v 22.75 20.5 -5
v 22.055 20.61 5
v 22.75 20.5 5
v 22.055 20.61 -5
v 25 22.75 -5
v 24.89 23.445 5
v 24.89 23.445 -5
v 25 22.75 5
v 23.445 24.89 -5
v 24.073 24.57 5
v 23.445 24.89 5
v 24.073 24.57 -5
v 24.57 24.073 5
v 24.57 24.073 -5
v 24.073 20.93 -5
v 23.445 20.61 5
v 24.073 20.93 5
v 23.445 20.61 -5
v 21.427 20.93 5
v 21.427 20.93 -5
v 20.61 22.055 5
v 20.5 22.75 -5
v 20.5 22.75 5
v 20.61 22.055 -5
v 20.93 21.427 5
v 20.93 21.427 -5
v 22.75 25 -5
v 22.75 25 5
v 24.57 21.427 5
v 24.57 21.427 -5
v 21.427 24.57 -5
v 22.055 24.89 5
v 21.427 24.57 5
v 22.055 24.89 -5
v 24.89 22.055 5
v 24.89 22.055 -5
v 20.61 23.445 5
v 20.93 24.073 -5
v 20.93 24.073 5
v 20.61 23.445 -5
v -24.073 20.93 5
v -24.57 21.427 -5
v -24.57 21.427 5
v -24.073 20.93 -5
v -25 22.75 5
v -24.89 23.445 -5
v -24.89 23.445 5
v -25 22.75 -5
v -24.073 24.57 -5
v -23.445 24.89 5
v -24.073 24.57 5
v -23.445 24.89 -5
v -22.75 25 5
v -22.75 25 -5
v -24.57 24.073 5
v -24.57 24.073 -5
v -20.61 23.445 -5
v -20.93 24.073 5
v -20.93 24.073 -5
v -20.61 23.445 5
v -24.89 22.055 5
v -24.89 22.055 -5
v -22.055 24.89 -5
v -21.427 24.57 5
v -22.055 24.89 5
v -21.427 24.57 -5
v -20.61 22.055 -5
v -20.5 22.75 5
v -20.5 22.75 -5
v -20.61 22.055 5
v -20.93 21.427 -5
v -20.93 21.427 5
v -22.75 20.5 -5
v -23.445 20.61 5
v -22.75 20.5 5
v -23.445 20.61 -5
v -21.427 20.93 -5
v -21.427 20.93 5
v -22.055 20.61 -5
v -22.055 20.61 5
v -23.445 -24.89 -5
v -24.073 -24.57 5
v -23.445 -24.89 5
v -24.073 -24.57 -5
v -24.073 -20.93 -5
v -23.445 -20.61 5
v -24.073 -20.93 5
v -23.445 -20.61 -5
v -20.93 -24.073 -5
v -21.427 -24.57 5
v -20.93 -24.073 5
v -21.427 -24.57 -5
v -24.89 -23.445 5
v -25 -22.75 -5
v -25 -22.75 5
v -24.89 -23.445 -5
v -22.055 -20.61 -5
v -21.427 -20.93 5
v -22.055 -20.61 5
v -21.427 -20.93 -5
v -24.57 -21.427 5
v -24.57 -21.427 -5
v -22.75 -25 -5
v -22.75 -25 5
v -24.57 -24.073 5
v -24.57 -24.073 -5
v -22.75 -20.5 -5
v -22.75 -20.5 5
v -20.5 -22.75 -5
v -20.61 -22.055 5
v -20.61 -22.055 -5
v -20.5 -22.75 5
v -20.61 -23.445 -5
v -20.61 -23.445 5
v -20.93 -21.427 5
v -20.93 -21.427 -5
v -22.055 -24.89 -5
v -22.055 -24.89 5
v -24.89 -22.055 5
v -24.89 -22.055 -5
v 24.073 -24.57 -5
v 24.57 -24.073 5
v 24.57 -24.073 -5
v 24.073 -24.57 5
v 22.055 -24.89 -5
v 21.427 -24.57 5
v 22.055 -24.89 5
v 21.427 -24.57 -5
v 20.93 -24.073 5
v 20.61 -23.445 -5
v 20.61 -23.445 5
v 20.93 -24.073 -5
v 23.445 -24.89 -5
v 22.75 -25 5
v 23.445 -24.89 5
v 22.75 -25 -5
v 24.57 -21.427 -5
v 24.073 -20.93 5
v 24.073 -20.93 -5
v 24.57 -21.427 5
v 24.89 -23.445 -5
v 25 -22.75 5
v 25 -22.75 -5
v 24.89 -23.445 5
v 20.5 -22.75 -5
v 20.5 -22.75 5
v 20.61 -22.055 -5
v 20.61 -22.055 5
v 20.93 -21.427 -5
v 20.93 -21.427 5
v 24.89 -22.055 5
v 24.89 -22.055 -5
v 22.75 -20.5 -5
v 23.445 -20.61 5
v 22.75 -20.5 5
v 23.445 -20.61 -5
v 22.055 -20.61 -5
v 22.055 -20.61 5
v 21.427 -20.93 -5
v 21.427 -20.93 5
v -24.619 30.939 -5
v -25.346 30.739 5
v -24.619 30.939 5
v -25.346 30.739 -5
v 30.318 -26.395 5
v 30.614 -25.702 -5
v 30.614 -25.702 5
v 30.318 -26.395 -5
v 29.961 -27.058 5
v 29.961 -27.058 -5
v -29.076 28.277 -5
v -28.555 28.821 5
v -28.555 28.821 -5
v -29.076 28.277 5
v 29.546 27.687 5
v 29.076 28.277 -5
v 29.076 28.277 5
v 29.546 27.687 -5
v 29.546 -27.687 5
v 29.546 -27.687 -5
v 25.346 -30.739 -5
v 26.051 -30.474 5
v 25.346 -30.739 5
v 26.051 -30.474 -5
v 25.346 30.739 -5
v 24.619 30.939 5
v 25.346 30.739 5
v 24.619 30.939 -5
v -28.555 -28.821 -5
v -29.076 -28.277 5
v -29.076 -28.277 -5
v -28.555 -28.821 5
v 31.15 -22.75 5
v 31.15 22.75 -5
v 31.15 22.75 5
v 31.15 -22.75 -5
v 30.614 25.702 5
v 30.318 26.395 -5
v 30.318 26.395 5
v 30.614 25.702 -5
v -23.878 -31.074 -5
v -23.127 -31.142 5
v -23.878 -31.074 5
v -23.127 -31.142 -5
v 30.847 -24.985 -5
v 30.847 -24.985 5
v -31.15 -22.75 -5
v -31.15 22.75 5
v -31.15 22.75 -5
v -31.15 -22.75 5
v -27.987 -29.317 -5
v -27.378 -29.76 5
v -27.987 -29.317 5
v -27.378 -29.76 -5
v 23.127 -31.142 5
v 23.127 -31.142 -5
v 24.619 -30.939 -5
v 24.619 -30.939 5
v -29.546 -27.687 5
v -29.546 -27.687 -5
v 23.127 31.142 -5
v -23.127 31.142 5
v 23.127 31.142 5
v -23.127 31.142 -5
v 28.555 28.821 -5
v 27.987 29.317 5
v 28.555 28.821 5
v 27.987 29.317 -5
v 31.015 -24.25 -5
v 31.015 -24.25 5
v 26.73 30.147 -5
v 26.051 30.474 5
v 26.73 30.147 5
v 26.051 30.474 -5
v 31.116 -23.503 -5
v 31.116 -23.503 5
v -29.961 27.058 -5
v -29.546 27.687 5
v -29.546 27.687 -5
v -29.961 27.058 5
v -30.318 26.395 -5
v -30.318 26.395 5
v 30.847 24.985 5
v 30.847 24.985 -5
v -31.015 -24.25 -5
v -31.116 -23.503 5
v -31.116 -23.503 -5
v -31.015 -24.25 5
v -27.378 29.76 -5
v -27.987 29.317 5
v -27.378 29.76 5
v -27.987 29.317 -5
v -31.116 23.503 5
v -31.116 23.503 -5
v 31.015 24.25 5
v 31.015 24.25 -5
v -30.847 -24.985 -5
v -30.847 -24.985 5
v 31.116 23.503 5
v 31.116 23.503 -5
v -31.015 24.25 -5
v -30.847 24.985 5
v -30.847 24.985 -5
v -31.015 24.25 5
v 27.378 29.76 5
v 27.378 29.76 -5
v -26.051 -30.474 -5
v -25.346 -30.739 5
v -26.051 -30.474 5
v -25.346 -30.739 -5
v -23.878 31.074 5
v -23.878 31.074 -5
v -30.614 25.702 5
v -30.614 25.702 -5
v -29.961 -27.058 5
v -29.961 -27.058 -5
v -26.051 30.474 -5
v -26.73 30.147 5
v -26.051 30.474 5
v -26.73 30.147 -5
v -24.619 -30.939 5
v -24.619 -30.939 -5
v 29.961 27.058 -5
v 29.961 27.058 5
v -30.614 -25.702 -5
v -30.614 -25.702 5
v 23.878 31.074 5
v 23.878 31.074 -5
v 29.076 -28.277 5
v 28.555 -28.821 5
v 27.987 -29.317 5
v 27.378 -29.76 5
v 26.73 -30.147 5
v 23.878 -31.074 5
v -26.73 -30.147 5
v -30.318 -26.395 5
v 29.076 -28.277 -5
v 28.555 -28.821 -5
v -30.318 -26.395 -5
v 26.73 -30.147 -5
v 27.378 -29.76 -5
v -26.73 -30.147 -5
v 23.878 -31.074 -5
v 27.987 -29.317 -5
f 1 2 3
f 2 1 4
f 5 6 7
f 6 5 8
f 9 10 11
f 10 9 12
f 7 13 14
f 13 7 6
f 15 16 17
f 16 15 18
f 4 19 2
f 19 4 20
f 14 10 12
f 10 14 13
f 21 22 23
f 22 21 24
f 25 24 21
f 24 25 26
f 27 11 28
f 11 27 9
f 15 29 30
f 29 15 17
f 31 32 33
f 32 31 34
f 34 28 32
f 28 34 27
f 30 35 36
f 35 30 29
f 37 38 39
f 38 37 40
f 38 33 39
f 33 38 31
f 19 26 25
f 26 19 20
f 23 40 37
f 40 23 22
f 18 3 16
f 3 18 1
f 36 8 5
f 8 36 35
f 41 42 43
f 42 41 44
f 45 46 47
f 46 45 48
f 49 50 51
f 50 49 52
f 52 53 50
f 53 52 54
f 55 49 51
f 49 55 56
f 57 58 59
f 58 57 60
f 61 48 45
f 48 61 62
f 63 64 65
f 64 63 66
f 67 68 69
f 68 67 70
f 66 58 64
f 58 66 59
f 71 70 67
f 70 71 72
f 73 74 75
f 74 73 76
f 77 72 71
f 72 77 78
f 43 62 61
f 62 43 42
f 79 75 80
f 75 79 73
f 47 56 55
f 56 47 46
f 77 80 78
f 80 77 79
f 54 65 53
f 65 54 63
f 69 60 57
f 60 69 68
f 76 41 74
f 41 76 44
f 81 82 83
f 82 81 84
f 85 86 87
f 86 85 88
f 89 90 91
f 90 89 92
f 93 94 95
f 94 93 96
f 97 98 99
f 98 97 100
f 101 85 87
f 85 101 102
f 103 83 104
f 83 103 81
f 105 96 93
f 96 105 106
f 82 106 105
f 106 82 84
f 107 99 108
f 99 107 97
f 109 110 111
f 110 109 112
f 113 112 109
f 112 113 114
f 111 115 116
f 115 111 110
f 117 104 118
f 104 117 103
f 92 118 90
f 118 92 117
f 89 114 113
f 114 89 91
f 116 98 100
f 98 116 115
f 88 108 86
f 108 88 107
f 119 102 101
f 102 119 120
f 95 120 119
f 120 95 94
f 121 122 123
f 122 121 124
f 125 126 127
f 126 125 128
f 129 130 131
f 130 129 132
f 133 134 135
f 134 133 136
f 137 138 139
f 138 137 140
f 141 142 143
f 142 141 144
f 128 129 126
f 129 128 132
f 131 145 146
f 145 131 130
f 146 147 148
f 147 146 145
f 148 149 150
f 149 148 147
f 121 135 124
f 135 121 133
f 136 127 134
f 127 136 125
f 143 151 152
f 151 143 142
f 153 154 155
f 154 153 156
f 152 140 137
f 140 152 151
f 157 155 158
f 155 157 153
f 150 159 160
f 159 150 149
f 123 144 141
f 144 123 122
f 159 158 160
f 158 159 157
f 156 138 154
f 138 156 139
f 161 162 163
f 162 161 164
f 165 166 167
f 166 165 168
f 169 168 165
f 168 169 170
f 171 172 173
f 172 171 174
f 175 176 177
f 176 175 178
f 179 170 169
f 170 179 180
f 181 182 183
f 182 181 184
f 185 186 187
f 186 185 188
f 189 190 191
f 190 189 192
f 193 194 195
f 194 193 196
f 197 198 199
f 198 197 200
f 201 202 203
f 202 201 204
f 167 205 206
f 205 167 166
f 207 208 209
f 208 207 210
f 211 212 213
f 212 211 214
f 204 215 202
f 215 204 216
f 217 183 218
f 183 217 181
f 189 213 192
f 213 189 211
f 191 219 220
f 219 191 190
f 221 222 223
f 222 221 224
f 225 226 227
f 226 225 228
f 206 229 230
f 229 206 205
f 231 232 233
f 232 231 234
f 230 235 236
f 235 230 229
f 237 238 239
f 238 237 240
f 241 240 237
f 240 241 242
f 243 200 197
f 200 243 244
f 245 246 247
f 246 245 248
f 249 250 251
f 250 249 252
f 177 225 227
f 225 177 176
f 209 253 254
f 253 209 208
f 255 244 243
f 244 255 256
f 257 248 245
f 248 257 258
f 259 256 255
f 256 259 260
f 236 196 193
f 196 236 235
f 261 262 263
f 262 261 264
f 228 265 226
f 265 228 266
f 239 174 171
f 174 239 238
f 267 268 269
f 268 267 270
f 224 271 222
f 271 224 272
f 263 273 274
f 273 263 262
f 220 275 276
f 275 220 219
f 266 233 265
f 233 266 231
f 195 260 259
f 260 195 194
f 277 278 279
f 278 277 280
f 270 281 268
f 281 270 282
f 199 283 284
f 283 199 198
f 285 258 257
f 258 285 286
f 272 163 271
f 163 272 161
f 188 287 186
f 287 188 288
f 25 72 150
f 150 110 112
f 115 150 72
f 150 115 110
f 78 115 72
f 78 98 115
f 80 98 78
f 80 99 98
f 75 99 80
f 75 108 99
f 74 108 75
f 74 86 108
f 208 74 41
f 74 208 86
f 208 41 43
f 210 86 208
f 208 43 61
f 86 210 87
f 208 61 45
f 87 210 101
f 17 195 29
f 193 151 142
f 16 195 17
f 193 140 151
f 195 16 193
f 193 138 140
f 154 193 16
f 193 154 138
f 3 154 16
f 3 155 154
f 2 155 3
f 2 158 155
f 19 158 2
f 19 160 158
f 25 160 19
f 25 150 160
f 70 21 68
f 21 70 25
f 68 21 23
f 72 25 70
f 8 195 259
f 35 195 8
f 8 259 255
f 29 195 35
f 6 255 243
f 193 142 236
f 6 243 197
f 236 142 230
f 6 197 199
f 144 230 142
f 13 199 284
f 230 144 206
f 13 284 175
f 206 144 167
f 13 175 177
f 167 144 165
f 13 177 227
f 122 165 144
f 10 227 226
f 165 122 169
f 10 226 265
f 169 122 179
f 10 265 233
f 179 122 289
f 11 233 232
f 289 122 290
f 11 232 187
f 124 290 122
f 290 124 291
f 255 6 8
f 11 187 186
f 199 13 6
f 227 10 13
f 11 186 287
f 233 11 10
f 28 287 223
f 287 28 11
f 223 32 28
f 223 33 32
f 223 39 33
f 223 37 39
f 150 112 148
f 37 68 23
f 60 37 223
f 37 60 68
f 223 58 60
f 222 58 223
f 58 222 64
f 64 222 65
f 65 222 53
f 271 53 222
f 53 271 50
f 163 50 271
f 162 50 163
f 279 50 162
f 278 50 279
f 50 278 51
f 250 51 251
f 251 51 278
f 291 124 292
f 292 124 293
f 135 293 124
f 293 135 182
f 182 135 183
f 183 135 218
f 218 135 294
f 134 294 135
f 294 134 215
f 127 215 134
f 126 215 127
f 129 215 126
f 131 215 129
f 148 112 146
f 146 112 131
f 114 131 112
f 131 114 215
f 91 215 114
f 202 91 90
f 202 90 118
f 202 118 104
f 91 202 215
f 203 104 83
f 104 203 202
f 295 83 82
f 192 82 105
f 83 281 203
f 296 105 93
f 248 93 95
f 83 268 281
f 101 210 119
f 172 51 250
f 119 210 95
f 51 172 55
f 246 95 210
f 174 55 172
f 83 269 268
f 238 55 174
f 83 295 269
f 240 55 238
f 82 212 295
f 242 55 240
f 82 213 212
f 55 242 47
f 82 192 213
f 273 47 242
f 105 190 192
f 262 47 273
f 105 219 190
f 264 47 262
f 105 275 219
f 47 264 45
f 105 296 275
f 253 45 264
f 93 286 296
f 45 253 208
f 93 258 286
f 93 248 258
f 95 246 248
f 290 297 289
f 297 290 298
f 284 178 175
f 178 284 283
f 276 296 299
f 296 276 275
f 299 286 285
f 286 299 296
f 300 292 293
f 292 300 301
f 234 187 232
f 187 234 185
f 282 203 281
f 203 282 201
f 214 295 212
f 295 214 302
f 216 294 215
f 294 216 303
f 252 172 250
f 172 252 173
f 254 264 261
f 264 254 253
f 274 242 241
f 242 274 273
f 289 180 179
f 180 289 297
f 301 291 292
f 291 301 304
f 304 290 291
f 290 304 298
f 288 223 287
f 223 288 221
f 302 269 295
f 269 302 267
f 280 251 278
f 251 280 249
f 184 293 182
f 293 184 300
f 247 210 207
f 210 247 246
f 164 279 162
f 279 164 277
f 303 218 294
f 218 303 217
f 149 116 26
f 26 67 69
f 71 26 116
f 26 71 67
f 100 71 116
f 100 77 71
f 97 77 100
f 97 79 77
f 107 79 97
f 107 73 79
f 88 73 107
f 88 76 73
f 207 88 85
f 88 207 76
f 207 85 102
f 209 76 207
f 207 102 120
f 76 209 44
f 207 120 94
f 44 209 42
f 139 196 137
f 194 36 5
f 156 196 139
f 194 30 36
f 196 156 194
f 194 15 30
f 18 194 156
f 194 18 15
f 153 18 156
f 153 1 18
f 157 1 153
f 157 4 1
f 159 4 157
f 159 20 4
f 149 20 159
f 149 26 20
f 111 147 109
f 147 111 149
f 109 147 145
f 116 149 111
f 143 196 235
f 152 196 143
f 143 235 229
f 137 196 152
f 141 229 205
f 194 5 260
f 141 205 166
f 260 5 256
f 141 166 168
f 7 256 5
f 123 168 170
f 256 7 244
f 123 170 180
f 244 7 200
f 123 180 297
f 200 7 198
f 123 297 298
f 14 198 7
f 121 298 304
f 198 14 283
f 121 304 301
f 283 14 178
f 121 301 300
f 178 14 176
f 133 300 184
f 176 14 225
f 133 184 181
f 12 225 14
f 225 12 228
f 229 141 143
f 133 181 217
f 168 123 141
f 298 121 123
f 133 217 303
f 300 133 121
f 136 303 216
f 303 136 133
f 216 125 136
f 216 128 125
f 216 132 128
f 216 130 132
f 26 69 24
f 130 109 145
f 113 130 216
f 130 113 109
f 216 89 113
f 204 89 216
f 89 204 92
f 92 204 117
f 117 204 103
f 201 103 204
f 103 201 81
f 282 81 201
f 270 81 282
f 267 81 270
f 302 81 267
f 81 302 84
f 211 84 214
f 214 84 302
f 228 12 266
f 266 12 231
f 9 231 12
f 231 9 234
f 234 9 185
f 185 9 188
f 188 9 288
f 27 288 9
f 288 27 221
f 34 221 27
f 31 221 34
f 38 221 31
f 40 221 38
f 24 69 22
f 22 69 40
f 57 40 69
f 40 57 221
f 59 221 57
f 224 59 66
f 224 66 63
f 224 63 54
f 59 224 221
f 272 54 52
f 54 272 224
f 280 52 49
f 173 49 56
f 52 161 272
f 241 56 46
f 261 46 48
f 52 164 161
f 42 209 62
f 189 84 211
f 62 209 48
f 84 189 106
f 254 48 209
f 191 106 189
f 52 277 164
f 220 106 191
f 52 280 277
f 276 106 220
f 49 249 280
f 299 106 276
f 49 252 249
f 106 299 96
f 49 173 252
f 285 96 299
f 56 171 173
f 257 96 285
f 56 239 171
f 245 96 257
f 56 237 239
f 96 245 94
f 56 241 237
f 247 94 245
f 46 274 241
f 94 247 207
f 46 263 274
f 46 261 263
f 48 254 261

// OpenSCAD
// file: ../../parameters.scad
maximum_printable_size = 150;

layer_thickness = 0.3;
global_clearance = 0.5;


// scale parameters
tower_height = 220;
mid_base_width = 400;
mid_base_height = 200;
mid_base_length = 300;
base_mid_base_hinge_offset = 50;


//Screw diameter and nut for M10 [mm]
M10_screw_diameter = 10.4;
M10_head_height = 10;
M10_head_diameter = 16+0.5;
M10_nut_height = 10.5;
M10_nut_diameter = 25.5;
M10_nut_pocket = 22.3;

//Screw diameter for M8 [mm]
M8_screw_diameter = 8.6;
M8_head_height = 8;
M8_head_diameter = 13.5;
M8_nut_height = 7.5;
M8_square_nut_thin_height = 4.5;
M8_nut_diameter = 14.4 + 0.5;
M8_nut_pocket = 13 + 0.5;
M8_washer_diameter = 16;
M8_washer_thickness = 1.5;


//Screw diameter and nut for M6 [mm]
M6_screw_diameter=6.5;
M6_head_diameter = 10+0.5;
M6_head_height = 6;
M6_nut_height = 4.9;
M6_nut_diameter = 11.8;
M6_nut_pocket = 10.4;
M6_square_nut_height = 3;
M6_square_nut_diameter = 10;
M6_washer_thickness = 1.6;

//Screw diameter and nut for M5 [mm]
M5_screw_diameter=5.5;
M5_head_height = 5;
M5_head_diameter = 13+0.5;
M5_nut_height = 4.5;
M5_nut_diameter = 9.4;
M5_nut_pocket = 8.4;

//Screw diameter and nut for M4 [mm]
M4_screw_diameter=4.5;
M4_screw_head_height = 4;
M4_nut_height = 3.2;
M4_nut_diameter = 8.4;
M4_nut_pocket = 7.5;

//Screw diameter and nut for M3 [mm]
M3_screw_diameter = 3.2;
M3_nut_height = 2.7;
M3_nut_diameter = 6.6;
M3_nut_pocket = 5.6;
M3_screw_head_height = 3;

//Screw diameter and nut for M2,5 [mm]
M2_5_screw_diameter = 2.7;
M2_5_nut_height = 2.3;
M2_5_nut_diameter = 6;
M2_5_nut_pocket = 5.5;

// kulove lozisko

bearing_efsm_08_h = 33+1;
bearing_efsm_08_m = 22;
bearing_efsm_08_db = 18;
bearing_efsm_08_ag = 10.5;
bearing_efsm_08_n = M4_screw_diameter;
bearing_efsm_08_a1 = 5.5;
bearing_efsm_08_d = 8.25;
bearing_efsm_08_B = 8; // ball height

bearing_efsm_10_h = 38+1;
bearing_efsm_10_m = 26;
bearing_efsm_10_db = 21.9;
bearing_efsm_10_ag = 12+0.2;
bearing_efsm_10_n = M5_screw_diameter;
bearing_efsm_10_a1 = 6.5;
bearing_efsm_10_d = 10.25;


bearing_efsm_12_width = 40+1;
bearing_efsm_12_h = bearing_efsm_12_width;
bearing_efsm_12_boltd = 28/2; // polovina vzdalenosti mezi srouby
bearing_efsm_12_m = bearing_efsm_12_boltd*2;
bearing_efsm_12_db = 25;
bearing_efsm_12_ag = 13;
bearing_efsm_12_a1 = 7;
bearing_efsm_12_n = M5_screw_diameter;
bearing_efsm_12_d = 12.15;
bearing_efsm_12_B = 10; // ball height
bearing_efsm_space = 1;

bearing_efsm_17_width = 54+1;
bearing_efsm_17_h = bearing_efsm_17_width;
bearing_efsm_17_boltd = 38/2; // polovina vzdalenosti mezi srouby
bearing_efsm_17_m = bearing_efsm_17_boltd*2;
bearing_efsm_17_db = 35;
bearing_efsm_17_ag = 18;
bearing_efsm_17_n = M6_screw_diameter;
bearing_efsm_17_a1 = 10;
bearing_efsm_17_B = 17; // ball height

//limcove lozisko
bearing_EFOM_10_L=26; //celkova sirka zakladny
bearing_EFOM_10_d1=10.3;//diametr otvoru real=10 mm
bearing_EFOM_10_dB=22;//diametr vystupku pro ulozeni lozika
bearing_EFOM_10_H=52;//celková delka zakladny
bearing_EFOM_10_J=36;// hole pitch
bearing_EFOM_10_A1=6.5;//vyska pouzdra
bearing_EFOM_10_Ag=12;//celkova vyska
bearing_EFOM_10_N1=5;//sirka otvoru pro sroub
bearing_EFOM_10_N2=8;//delka otvoru pro sroub
bearing_EFOM_10_m=36;//roztec der pro sroub
bearing_EFOM_10_h=9;//vyska lozika


608_bearing_outer_diameter = 22.3;
608_bearing_inner_diameter = 16;
608_bearing_thickness = 7.1;


// 20 KG servo parameters

servo_20kg_axis_offset = 9.375; // jak je osa mimo stredu
servo_20kg_body_x = 42;
servo_20kg_body_y = 21;
servo_20kg_body_z = 40;
servo_20kg_thread_x = 49/2;
servo_20kg_thread_y = 10/2;
servo_20kg_body_below = 10; // jak hluboko je tělo serva pod drzaky na srouby
servo_20kg_below = 25.8; // jak hluboko je páka serva pod drzaky na srouby

servo_20kg_bolt_d = 2.5+0.3;
servo_20kg_nut_d = 5+0.3;


//strain gauge
strain_gauge_width = 12.7;
strain_gauge_length = 75.1;
strain_gauge_screw_distance = 10;

//ALU profile
ALU_profile_width = 30.5;
ALU_profile_holder_wall_thickness = 3;
ALU_profile_groove_width = 8;

//pillow block bearing
//https://www.igus.eu/product/372
//Part no. KSTM-08
KSTM08_screws_distance = 33;         //m
KSTM08_screws_holes_diameter = 4.5;  //d2
KSTM08_flange_thickness = 6;         //h3
KSTM08_case_width = 9;               //C1
KSTM08_case_length = 47;             //a
KSTM08_ball_width = 12;              //B
KSTM08_ball_hole_diameter = 7.85;    //d1


//ložiska pro malý rotor
bearing_outer_diameter = 10.2;    // Rozměr B1 v nákresu s přídavkem na toleranci otvoru
bearing_thickness = 4;        // Rozměr B2 v nákresu
//bearing_shaft_length = 19.5;    // Rozměr B3 v nákresu, Originalni hodnota 19.5
bearing_shaft_length = 20;    // Rozměr B3 v nákresu


//parametry víčka s telemetrickou anténou
S01_sila_materialu=1.2;
S01_vyska_horni_zavit=10;
S01_hloubka_zavitu=4;
S01_prumer_vnitrni=50;
LO_spodni_prumer=17.2;
LO_vyska_bez_krytu=15;
S01_tolerance_zavit=1.5;
R01_vyska_prekryti_statoru=10;

g3_0_cone1 = 70;
g3_0_srcew_dist = 55;
// main file
/*
pro díl do kterého se zastrkávají matky z boku
    rotor_joint(1);

pro díl který obsahuje jen díry na šrouby M4
    rotor_joint(2);

pro díl co má díry na matky ze shora
    rotor_joint(3);
*/


include <../../parameters.scad>

module rotor_joint(mode, thickness=10) {
    module screw_nut_hole() {
        difference() {
            translate([(ALU_profile_width/2+ALU_profile_holder_wall_thickness+M4_screw_diameter), (ALU_profile_width/2+ALU_profile_holder_wall_thickness+M4_screw_diameter), 0])
                cylinder(d=M4_screw_diameter, h=thickness+0.1, center=true, $fn=20);
            translate([(ALU_profile_width/2+ALU_profile_holder_wall_thickness+M4_screw_diameter), (ALU_profile_width/2+ALU_profile_holder_wall_thickness+M4_screw_diameter), thickness/2+.01])
                cylinder(d=M4_screw_diameter, h=1, $fn=20); 
        }

        hull() {
            translate([(ALU_profile_width/2+ALU_profile_holder_wall_thickness+M4_screw_diameter), (ALU_profile_width/2+ALU_profile_holder_wall_thickness+M4_screw_diameter), 0])
                rotate([0, 0, 30])
                    cylinder(d=M4_nut_diameter, h=M4_nut_height, $fn=6, center=true);

            translate([(ALU_profile_width/2+ALU_profile_holder_wall_thickness+M4_screw_diameter), (ALU_profile_width/2+ALU_profile_holder_wall_thickness+M4_screw_diameter)+M4_screw_diameter*2, 0])
                cube([M4_nut_pocket, M4_screw_diameter, M4_nut_height], center=true);
        }
    }

    difference() {
        minkowski() {
            cube([ALU_profile_width+ALU_profile_holder_wall_thickness*2+M4_screw_diameter*2, ALU_profile_width+ALU_profile_holder_wall_thickness*2+M4_screw_diameter*2, thickness/2], center=true);
            cylinder(d=M4_nut_diameter*2, h=thickness/2, $fn=70, center=true);
        }

        if(mode == 1) {
            for(i = [0:90:360]) {
                rotate([0, 0, i])
                    screw_nut_hole();
            }
        }
        else if(mode == 2) {
            for(i = [0:90:360])
            rotate([0, 0, i])
            translate([(ALU_profile_width/2+ALU_profile_holder_wall_thickness+M4_screw_diameter), (ALU_profile_width/2+ALU_profile_holder_wall_thickness+M4_screw_diameter), 0]) {
                cylinder(d=M4_screw_diameter, h=thickness+0.1, $fn=20, center=true);
            }
        }
        else if(mode == 3) {
            for(i = [0:90:360]) {
                rotate([0, 0, i])
                translate([(ALU_profile_width/2+ALU_profile_holder_wall_thickness+M4_screw_diameter), (ALU_profile_width/2+ALU_profile_holder_wall_thickness+M4_screw_diameter), 0]) {
                    cylinder(d=M4_screw_diameter, h=thickness, $fn=20, center=true);
                    translate([0, 0, thickness/2-M4_nut_height+0.1])
                    cylinder(d=M4_nut_diameter, h=M4_nut_height+0.1, $fn=6);
                }
            }
        }
    }
}

rotor_joint(2);
